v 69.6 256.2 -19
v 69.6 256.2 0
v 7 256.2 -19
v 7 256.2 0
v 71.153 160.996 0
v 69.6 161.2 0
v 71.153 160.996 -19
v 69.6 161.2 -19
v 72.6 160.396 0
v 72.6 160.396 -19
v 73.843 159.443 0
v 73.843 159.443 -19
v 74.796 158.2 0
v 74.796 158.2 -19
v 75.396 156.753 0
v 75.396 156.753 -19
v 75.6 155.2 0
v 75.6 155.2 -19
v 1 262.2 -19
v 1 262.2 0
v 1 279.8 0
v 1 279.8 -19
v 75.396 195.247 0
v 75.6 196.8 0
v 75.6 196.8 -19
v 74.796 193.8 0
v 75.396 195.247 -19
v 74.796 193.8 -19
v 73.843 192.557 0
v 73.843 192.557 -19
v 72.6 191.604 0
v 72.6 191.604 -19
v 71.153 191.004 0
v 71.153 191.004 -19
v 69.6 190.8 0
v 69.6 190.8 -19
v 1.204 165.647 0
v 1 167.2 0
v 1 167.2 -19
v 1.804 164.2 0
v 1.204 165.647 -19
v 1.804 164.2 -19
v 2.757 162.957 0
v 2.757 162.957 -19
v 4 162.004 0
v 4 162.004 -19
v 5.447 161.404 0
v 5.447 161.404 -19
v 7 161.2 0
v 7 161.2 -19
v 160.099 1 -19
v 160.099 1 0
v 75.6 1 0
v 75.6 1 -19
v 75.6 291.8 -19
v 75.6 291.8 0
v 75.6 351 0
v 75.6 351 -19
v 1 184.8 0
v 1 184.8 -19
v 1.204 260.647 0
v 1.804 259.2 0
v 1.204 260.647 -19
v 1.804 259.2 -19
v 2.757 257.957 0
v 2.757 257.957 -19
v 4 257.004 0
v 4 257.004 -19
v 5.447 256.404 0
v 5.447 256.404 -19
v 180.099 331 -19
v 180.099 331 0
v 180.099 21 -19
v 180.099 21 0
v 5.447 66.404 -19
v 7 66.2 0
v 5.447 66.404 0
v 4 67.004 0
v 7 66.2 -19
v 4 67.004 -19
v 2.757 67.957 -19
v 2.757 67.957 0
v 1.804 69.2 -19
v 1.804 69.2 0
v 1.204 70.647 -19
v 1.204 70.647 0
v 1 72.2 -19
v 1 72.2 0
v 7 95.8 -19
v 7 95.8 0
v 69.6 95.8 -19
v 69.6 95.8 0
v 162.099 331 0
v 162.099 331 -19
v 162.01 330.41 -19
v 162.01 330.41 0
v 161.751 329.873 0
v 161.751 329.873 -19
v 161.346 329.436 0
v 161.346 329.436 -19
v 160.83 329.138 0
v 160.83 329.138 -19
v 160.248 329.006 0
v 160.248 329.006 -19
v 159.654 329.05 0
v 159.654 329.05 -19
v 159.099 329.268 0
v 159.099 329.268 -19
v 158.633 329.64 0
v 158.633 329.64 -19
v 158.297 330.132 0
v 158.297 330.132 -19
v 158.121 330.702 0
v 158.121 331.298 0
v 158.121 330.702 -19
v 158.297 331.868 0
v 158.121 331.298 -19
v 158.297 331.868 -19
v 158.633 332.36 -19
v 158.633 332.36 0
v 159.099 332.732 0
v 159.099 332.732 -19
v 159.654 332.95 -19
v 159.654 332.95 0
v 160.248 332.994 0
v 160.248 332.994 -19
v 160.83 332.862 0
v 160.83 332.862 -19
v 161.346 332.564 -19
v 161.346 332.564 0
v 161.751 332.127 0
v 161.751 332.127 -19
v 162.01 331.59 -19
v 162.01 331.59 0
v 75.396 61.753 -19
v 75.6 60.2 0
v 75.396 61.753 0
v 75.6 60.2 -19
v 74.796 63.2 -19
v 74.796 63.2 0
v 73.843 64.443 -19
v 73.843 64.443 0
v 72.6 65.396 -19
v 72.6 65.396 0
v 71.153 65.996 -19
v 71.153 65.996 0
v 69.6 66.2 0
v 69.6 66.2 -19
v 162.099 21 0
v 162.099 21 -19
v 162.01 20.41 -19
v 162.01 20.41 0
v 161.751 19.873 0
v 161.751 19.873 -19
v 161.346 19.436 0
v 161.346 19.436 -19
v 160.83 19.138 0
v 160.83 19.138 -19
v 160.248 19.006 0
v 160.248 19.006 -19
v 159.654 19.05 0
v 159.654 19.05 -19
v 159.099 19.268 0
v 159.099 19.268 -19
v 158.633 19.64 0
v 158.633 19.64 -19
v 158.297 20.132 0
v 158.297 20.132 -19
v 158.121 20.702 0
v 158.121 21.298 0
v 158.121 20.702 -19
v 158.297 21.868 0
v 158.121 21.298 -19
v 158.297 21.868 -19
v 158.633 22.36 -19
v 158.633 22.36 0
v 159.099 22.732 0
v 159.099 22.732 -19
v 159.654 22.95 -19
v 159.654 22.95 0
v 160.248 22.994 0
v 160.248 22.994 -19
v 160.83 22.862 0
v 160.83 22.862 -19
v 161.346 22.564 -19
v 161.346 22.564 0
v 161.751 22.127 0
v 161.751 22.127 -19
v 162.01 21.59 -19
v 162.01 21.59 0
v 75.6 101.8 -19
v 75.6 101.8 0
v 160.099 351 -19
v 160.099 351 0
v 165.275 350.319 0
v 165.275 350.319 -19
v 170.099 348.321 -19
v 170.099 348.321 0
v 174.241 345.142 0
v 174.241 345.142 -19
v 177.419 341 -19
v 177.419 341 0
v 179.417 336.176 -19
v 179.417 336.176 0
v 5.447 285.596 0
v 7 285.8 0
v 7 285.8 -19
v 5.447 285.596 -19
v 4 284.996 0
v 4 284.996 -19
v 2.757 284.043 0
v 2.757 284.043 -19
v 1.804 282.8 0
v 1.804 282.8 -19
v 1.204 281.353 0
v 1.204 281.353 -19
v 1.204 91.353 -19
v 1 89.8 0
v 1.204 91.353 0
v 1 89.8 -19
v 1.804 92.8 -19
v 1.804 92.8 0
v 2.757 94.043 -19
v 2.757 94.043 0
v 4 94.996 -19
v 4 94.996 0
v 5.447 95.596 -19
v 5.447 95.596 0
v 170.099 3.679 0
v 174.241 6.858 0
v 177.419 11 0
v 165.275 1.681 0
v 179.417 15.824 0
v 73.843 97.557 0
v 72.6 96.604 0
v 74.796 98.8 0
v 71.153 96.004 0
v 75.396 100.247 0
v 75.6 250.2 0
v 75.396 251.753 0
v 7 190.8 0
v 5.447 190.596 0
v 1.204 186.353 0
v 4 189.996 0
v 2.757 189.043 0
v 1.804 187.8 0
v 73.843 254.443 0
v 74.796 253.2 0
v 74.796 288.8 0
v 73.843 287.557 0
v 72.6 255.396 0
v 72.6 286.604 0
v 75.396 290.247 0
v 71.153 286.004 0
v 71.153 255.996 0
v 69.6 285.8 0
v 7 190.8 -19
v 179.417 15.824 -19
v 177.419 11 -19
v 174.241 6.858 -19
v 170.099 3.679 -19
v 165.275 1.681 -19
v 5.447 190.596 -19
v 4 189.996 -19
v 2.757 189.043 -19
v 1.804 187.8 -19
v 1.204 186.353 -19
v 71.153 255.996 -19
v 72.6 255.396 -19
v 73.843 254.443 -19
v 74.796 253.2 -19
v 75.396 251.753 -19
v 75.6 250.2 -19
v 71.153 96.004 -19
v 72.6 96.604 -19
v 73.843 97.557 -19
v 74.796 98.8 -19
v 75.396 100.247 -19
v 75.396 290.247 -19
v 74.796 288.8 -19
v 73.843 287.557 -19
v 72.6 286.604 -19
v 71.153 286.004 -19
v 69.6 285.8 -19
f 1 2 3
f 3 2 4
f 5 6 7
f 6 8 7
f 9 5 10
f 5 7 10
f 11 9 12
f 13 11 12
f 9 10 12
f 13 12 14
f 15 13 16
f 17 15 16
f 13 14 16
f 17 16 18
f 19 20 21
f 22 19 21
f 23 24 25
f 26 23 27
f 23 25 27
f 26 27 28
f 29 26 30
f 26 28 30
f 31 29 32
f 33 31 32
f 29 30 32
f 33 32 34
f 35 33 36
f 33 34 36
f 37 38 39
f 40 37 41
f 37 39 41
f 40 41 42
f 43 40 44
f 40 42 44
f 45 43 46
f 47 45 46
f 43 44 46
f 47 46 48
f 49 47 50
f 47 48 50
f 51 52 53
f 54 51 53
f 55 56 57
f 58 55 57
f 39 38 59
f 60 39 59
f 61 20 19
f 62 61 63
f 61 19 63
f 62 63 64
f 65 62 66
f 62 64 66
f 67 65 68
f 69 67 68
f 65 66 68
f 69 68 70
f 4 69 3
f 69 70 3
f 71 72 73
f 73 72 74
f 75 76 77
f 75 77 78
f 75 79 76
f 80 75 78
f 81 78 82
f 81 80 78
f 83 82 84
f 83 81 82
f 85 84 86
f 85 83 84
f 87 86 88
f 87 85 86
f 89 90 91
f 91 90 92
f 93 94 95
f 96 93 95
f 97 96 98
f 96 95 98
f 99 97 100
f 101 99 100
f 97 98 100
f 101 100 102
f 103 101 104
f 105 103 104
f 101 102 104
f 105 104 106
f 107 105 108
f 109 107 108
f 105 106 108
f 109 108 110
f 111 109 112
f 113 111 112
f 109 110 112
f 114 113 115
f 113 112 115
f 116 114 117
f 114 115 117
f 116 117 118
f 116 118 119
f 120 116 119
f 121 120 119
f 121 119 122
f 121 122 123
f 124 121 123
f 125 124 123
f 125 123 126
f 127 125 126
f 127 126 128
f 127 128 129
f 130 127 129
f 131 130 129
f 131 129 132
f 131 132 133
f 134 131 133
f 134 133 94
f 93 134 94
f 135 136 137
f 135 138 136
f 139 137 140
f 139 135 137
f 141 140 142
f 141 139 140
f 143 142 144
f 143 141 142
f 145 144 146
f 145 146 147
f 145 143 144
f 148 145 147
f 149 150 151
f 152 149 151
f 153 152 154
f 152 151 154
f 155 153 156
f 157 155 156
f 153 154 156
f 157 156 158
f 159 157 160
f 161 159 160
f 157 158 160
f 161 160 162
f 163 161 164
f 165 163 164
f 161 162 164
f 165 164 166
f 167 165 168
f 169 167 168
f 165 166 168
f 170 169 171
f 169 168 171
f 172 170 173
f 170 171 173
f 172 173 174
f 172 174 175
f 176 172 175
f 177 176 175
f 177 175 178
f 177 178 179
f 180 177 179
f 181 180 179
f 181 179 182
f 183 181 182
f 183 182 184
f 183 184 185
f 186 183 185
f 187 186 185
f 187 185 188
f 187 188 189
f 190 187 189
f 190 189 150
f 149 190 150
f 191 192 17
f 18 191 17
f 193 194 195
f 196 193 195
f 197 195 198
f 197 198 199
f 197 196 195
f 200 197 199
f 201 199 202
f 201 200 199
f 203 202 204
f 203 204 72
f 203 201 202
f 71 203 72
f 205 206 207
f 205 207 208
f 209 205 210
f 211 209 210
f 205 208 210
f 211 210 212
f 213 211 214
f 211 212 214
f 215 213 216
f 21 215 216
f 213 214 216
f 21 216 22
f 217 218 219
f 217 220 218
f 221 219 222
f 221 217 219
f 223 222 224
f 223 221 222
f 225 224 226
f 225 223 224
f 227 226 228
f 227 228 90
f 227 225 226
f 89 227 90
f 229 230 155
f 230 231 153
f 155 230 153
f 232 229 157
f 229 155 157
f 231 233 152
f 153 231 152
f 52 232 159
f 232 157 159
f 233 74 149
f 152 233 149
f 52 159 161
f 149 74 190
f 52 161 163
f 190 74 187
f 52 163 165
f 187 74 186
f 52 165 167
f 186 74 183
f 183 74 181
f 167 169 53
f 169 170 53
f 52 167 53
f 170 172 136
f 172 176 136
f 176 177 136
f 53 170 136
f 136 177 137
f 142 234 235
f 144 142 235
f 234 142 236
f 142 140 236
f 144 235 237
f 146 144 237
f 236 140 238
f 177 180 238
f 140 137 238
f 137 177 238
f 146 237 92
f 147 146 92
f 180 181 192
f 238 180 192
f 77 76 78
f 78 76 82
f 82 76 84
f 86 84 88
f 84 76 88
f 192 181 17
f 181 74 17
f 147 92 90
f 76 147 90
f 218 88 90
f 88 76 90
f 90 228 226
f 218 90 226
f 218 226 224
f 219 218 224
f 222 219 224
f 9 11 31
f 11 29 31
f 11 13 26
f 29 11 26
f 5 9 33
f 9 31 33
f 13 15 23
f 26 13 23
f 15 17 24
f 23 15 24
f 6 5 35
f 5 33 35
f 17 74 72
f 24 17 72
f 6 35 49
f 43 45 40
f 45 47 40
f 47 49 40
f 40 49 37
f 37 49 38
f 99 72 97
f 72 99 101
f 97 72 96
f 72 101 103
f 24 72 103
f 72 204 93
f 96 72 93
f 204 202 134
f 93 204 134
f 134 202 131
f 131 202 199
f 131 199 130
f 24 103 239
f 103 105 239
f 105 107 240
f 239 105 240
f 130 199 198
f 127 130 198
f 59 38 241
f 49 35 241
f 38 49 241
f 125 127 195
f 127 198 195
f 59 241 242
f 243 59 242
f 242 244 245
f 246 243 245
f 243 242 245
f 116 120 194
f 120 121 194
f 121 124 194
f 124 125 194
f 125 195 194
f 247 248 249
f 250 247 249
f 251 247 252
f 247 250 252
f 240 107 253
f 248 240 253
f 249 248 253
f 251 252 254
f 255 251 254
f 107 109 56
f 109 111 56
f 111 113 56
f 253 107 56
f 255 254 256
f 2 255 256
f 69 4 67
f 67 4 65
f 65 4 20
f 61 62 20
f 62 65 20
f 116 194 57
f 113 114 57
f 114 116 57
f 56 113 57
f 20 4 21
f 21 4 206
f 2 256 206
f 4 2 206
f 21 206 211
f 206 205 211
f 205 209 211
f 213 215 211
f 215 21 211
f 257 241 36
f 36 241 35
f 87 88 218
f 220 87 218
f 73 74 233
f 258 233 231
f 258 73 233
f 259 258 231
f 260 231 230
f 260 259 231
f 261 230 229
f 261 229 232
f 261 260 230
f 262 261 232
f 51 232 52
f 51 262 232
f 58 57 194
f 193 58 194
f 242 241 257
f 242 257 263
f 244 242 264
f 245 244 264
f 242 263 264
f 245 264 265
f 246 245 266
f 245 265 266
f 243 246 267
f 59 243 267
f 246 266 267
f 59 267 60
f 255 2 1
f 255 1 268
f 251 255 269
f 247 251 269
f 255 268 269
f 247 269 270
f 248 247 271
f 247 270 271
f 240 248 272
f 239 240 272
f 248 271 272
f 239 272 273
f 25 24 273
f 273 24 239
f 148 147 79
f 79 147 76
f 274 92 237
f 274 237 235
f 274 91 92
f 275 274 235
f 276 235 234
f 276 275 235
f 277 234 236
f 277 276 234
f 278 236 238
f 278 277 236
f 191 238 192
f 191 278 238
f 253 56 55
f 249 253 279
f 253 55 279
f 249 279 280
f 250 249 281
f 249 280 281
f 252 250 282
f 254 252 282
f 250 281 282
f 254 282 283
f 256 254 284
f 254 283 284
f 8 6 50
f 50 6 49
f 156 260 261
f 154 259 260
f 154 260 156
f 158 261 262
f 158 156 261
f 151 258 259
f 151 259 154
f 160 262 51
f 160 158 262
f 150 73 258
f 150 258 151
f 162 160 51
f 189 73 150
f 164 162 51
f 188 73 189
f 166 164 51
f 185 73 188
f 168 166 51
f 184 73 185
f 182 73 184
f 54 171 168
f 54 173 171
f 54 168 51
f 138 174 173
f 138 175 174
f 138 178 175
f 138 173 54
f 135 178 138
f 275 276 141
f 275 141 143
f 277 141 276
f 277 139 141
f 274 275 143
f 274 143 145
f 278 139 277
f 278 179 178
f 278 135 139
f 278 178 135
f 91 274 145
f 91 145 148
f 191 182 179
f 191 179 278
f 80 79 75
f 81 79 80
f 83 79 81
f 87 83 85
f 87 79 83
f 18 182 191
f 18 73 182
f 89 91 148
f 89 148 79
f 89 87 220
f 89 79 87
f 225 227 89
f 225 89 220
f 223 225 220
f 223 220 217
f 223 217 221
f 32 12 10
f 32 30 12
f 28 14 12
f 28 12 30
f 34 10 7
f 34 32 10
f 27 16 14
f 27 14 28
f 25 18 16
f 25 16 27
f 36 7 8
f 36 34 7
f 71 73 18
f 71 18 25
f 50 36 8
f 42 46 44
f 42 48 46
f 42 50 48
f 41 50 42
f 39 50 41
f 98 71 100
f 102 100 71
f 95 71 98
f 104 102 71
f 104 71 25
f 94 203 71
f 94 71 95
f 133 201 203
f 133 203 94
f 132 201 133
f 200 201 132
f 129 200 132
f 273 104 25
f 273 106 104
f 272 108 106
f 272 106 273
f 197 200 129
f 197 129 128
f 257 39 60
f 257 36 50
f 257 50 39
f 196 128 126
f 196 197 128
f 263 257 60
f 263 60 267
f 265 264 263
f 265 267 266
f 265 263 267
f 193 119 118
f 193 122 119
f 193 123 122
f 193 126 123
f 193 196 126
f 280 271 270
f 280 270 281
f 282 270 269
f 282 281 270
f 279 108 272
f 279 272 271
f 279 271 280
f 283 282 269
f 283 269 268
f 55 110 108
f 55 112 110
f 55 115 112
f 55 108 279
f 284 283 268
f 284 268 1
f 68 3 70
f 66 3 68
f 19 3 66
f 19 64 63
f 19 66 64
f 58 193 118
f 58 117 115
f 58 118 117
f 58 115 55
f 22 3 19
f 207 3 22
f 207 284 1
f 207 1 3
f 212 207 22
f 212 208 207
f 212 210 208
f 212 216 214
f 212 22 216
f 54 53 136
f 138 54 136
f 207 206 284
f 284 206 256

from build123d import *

# Parameters (mm, degrees)
PAD014_DEPTH    = 19
FILLET002_R     = 20
FILLET003_R     = 6
SKETCH029_R     = 2
POCKET019_DEPTH = 19.001


with BuildPart() as part:
    # Sketch017 → Pad014 (new body)
    with BuildSketch(Plane.XY):
        Polygon((275, 216.2), (379.498932, 216.2), (379.498932, -133.8), (275, -133.8), (275, -68.6), (200.4, -68.6), (200.4, -39), (275, -39), (275, 26.4), (200.4, 26.4), (200.4, 56), (275, 56), (275, 121.4), (200.4, 121.4), (200.4, 151), (275, 151), align=None)
    extrude(amount=-PAD014_DEPTH)

    # Fillet002
    fillet002_edges = [part.edges().sort_by_distance(p)[0] for p in [
        (379.498932, 216.2, -9.5),
        (379.498932, -133.8, -9.5),
    ]]
    fillet(fillet002_edges, radius=FILLET002_R)

    # Fillet003
    fillet003_edges = [part.edges().sort_by_distance(p)[0] for p in [
        (200.4, 151, -9.5),
        (200.4, 121.4, -9.5),
        (200.4, 26.4, -9.5),
        (200.4, 56, -9.5),
        (200.4, -39, -9.5),
        (200.4, -68.6, -9.5),
        (275, 151, -9.5),
        (275, 121.4, -9.5),
        (275, 26.4, -9.5),
        (275, -68.6, -9.5),
        (275, -39, -9.5),
        (275, 56, -9.5),
    ]]
    fillet(fillet003_edges, radius=FILLET003_R)

    # Sketch029 (on Face32 of Fillet003) → Pocket019 (cut, through all)
    with BuildSketch(Plane(origin=(0, 0, -19), x_dir=(1, 0, 0), z_dir=(0, 0, -1))):
        with Locations((359.498932, 113.8)):
            Circle(SKETCH029_R)
        with Locations((359.498932, -196.2)):
            Circle(SKETCH029_R)
    extrude(amount=-POCKET019_DEPTH, mode=Mode.SUBTRACT)


with BuildPart() as part_1:
    # Body010 placement: moved
    add(part.part.moved(Location((0, 0, -9))))


with BuildPart() as part_2:
    # Clone placement: moved
    add(part_1.part.moved(Location((-199.4, 134.8, 9))))


solid = part_2.part
